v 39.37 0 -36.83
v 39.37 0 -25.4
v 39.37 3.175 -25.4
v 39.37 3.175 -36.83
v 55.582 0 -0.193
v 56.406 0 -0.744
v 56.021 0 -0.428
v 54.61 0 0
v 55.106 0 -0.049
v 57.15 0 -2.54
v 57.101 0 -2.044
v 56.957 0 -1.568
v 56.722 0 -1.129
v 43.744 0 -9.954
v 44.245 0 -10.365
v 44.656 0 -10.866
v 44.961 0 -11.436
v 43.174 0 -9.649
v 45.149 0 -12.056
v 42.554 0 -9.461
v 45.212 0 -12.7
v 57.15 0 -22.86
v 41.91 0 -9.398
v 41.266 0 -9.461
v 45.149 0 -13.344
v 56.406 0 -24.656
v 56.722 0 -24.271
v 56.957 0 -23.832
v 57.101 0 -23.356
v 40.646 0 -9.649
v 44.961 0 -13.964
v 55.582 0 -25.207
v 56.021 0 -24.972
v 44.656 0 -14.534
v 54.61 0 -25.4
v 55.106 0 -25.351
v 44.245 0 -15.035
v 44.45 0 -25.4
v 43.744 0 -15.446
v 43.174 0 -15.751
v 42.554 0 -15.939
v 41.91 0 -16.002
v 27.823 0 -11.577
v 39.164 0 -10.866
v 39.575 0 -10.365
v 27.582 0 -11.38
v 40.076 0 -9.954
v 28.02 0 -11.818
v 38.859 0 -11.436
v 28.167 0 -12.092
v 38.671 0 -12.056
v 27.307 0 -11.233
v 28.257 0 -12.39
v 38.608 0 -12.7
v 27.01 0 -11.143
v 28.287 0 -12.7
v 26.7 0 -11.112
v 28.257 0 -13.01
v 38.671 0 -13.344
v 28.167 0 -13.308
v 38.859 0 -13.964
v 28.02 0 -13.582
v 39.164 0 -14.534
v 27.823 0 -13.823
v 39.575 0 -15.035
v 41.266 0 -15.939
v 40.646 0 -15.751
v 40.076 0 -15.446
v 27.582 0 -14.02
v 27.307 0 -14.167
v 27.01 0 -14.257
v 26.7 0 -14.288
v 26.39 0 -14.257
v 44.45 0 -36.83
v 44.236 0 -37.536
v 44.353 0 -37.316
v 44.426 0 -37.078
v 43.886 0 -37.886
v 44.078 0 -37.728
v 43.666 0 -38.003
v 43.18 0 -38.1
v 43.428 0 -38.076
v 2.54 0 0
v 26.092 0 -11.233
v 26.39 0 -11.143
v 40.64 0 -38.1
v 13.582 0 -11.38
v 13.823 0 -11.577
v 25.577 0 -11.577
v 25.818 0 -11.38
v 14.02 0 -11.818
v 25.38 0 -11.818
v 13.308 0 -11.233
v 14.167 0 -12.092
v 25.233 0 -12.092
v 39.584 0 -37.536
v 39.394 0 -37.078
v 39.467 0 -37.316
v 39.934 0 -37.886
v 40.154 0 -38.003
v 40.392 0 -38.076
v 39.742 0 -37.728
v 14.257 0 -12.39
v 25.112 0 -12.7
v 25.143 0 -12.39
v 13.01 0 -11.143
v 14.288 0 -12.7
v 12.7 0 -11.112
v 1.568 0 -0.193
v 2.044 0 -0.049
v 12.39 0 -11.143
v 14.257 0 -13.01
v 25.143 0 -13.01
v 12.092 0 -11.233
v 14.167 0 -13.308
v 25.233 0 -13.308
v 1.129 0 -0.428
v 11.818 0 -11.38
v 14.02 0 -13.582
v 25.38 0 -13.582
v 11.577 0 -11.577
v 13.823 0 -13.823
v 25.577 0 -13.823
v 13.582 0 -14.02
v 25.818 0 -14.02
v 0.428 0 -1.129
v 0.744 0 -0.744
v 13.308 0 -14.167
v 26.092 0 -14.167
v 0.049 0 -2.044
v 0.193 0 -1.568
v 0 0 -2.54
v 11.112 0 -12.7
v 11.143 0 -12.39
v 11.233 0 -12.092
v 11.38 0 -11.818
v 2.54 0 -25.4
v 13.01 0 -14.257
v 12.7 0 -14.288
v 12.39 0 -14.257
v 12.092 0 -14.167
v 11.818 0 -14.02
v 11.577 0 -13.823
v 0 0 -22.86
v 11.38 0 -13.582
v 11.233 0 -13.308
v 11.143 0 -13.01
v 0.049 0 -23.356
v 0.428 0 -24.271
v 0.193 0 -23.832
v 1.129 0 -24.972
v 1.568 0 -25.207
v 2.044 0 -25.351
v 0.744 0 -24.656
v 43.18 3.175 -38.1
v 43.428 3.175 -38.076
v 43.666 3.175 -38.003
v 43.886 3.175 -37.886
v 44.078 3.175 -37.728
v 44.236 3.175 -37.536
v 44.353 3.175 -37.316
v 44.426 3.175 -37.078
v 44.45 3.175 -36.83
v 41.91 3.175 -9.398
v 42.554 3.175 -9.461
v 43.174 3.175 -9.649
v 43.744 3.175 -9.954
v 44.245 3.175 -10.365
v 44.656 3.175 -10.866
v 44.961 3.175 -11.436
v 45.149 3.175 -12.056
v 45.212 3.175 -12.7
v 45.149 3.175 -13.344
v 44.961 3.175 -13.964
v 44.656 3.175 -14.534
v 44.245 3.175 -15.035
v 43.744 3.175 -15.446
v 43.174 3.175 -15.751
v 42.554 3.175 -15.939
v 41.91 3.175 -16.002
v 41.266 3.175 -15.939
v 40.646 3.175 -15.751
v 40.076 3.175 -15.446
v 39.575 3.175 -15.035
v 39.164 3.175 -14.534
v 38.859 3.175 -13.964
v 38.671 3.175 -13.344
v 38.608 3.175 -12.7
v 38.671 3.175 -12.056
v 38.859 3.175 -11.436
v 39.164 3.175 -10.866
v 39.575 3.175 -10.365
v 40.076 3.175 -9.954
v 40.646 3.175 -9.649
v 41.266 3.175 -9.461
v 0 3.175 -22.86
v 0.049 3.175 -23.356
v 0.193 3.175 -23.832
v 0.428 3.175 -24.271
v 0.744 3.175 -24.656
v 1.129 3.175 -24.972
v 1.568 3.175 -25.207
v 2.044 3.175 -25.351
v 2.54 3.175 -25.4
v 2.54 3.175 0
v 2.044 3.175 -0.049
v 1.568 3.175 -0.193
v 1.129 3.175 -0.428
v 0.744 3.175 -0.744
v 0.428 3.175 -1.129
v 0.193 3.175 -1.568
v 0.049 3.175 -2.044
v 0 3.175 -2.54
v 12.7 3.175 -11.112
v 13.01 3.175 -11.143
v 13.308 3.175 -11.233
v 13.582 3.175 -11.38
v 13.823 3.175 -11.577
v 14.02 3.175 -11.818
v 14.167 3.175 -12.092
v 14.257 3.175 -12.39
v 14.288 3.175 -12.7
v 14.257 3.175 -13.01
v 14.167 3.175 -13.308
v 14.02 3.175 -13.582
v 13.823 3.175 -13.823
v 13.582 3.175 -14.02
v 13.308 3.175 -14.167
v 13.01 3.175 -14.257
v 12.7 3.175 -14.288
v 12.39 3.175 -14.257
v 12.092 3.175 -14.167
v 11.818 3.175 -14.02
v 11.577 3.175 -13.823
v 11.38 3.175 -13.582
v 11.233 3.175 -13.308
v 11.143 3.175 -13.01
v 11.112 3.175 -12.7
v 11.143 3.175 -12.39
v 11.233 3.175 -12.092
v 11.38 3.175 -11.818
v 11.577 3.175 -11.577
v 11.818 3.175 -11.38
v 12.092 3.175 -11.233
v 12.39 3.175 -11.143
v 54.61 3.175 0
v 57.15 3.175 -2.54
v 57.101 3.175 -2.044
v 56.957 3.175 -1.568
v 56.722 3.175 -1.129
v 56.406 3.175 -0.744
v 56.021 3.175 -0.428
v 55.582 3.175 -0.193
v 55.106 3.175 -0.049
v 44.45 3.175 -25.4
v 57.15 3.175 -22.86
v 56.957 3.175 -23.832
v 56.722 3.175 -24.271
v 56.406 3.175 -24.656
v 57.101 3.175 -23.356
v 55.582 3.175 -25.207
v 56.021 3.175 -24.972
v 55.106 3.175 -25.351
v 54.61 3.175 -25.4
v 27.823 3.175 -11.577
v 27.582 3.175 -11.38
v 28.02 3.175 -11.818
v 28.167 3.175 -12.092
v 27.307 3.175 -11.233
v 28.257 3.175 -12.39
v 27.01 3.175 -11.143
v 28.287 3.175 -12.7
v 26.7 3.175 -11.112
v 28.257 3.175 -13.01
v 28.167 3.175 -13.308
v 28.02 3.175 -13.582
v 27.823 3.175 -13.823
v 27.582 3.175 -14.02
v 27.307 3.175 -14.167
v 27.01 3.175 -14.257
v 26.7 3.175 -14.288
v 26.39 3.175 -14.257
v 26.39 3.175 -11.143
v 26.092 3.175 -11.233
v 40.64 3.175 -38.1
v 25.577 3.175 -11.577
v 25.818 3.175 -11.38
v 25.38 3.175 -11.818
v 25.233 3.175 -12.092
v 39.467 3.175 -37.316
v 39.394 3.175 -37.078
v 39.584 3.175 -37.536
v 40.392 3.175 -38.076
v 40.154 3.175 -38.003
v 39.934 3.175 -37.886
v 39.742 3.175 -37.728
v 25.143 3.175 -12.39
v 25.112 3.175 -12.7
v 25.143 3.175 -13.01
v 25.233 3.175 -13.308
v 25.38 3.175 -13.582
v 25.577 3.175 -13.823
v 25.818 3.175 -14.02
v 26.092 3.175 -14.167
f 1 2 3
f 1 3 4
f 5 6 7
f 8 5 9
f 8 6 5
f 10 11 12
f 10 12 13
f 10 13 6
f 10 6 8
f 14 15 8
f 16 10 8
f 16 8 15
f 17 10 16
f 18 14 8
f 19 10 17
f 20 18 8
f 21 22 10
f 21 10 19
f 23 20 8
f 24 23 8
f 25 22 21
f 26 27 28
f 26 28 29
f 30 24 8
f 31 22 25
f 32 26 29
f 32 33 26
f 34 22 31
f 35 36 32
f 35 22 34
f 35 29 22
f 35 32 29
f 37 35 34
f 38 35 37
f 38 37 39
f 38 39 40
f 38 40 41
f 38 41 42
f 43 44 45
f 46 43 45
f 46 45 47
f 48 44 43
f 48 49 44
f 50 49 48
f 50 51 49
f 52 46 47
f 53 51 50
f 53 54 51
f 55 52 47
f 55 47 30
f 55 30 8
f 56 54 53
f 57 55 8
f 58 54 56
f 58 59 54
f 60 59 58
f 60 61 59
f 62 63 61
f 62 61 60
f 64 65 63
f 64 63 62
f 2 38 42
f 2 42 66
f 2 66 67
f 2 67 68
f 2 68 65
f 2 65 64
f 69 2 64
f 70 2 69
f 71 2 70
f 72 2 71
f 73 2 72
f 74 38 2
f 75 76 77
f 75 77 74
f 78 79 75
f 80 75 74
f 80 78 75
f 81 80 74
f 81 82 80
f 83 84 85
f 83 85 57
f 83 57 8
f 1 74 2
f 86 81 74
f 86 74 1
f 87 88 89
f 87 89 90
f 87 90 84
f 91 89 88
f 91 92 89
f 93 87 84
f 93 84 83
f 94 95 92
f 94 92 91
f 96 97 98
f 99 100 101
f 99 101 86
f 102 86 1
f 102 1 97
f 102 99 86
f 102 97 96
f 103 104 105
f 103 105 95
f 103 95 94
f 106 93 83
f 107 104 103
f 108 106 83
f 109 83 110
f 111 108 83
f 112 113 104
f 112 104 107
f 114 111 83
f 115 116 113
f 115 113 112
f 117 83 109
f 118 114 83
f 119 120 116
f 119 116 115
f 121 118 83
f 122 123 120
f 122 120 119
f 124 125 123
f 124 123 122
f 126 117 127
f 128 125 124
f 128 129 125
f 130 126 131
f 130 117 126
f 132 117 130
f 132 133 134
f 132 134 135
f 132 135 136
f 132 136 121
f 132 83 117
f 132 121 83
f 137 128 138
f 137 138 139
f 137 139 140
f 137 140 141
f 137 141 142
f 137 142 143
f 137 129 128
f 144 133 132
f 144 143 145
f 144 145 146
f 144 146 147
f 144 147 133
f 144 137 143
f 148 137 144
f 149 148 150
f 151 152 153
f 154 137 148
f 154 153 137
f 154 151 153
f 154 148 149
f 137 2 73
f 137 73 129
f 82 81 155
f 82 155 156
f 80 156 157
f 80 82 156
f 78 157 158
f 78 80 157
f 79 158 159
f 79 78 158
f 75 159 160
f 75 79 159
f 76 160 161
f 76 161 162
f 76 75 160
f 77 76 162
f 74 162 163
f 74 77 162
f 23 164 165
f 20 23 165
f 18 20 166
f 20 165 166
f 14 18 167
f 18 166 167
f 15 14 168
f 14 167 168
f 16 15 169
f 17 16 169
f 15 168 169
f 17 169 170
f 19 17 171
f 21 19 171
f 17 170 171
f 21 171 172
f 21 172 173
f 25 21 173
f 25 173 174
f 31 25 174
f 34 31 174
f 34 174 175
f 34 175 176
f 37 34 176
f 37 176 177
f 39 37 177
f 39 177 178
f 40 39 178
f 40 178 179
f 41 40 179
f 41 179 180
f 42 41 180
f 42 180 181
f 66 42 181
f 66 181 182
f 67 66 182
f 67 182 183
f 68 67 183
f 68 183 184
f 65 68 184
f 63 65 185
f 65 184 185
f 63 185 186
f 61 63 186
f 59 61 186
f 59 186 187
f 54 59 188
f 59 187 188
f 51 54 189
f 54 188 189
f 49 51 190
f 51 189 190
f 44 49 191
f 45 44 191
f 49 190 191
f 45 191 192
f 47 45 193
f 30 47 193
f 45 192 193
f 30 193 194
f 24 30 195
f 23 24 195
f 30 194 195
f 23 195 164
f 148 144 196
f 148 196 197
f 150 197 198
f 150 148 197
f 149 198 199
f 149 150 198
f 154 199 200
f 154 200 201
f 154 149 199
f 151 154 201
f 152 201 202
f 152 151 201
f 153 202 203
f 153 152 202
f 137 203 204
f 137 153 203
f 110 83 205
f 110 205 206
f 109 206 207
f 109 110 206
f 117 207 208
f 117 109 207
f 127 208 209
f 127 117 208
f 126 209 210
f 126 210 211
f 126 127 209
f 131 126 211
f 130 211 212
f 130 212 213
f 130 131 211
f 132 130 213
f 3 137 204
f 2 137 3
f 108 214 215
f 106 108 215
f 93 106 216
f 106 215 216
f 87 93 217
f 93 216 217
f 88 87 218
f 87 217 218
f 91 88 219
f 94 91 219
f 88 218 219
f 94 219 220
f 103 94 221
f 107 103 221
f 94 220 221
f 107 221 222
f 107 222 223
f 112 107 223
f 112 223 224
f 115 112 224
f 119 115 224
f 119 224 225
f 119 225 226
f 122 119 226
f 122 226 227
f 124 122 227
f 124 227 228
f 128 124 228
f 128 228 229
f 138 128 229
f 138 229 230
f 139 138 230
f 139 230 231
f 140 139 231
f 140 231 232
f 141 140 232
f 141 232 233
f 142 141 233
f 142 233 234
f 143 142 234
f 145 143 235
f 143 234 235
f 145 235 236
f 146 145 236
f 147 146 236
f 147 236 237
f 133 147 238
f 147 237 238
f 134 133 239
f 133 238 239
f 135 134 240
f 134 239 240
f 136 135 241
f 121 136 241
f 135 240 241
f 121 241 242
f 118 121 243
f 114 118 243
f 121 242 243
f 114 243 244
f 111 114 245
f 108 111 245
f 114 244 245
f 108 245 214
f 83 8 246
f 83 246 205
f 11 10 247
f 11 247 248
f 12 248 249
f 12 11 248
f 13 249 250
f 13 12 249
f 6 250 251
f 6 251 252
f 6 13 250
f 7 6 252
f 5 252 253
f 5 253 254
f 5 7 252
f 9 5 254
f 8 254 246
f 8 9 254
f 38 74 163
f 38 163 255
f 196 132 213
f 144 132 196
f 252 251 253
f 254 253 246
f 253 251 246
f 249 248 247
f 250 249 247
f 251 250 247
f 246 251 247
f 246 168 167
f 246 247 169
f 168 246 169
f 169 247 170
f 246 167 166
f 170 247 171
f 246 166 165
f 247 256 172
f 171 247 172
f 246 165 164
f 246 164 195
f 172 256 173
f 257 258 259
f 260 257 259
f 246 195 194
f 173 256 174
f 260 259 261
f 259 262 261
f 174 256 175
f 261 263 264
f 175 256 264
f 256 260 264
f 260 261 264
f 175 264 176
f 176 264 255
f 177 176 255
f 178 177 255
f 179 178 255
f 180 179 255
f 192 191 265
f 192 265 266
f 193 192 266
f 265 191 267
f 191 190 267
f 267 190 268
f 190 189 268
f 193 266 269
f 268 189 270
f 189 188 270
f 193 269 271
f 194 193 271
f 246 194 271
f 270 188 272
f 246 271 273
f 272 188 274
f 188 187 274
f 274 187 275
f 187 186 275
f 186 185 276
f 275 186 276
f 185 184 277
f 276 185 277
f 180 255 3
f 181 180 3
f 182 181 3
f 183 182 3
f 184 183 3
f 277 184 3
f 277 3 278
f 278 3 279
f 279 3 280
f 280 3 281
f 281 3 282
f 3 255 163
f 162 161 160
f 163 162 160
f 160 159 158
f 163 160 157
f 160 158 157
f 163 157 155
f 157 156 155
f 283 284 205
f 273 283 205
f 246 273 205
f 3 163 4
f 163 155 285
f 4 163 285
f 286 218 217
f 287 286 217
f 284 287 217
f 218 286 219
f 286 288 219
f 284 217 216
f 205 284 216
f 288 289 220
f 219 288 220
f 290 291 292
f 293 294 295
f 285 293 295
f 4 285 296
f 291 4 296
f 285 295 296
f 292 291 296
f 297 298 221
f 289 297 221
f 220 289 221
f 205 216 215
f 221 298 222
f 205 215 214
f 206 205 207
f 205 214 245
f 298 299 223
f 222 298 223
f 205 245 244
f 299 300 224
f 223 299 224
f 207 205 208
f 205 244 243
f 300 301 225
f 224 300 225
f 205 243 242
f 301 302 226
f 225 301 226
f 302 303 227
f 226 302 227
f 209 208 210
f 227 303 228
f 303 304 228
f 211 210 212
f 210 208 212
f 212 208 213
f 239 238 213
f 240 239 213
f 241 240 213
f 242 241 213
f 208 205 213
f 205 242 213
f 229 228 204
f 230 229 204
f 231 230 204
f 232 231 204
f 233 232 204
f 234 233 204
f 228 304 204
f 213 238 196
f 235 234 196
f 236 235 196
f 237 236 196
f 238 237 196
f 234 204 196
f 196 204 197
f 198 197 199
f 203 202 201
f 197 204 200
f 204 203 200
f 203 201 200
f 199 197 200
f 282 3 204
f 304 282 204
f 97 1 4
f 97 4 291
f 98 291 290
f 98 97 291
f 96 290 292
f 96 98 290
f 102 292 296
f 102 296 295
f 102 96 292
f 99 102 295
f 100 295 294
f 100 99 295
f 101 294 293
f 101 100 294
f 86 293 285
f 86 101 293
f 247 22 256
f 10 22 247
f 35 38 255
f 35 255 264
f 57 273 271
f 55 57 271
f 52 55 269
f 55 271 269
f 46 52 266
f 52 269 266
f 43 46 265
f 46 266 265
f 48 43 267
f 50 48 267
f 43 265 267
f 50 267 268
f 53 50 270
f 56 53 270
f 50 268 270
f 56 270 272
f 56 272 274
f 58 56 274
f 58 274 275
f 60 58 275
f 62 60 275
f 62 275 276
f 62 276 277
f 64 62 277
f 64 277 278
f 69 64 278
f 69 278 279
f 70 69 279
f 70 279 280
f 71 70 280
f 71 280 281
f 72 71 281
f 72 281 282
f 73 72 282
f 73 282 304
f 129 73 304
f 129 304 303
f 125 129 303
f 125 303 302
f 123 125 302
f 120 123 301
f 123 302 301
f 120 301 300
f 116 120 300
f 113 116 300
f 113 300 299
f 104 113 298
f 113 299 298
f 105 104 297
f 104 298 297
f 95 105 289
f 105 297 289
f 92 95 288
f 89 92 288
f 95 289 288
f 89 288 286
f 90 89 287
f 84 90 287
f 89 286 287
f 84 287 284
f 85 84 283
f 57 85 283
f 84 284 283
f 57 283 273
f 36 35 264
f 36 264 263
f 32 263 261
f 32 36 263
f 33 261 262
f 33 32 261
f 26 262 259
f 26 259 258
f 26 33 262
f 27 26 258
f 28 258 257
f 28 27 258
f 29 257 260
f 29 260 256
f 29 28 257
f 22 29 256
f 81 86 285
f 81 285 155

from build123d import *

# Parameters (mm, degrees)
BOSS_EXTRUDE1_DEPTH = 3.175
CUT_EXTRUDE1_REACH  = 70.759
SKETCH2_R           = 1.5875
SKETCH2_R_2         = 3.302


with BuildPart() as part:
    # Sketch1 → Boss-Extrude1 (new body)
    with BuildSketch(Plane(origin=(0, 0, 0), x_dir=(1, 0, 0), z_dir=(0, 1, 0))):
        with BuildLine():
            Line((44.45, 25.4), (54.61, 25.4))
            ThreePointArc((54.61, 25.4), (56.406051224, 24.656051224), (57.15, 22.86))
            Line((57.15, 22.86), (57.15, 2.54))
            ThreePointArc((57.15, 2.54), (56.406051224, 0.743948776), (54.61, 0))
            Line((54.61, 0), (2.54, 0))
            ThreePointArc((2.54, 0), (0.743948776, 0.743948776), (0, 2.54))
            Line((0, 2.54), (0, 22.86))
            ThreePointArc((0, 22.86), (0.743948776, 24.656051224), (2.54, 25.4))
            Line((2.54, 25.4), (39.37, 25.4))
            Line((39.37, 25.4), (39.37, 36.83))
            ThreePointArc((39.37, 36.83), (39.741974388, 37.728025612), (40.64, 38.1))
            Line((40.64, 38.1), (43.18, 38.1))
            ThreePointArc((43.18, 38.1), (44.078025612, 37.728025612), (44.45, 36.83))
            Line((44.45, 36.83), (44.45, 25.4))
        make_face()
    extrude(amount=BOSS_EXTRUDE1_DEPTH)

    # Sketch2 → Cut-Extrude1 (cut, up to next)
    with BuildSketch(Plane(origin=(0, 3.175, 0), x_dir=(1, 0, 0), z_dir=(0, 1, 0)), mode=Mode.PRIVATE) as cut_extrude1_sk1:
        with Locations(Location((12.7, 12.7, 0), (0, 0, 270))):
            Circle(SKETCH2_R)
    cut_extrude1_tool1 = extrude(cut_extrude1_sk1.sketch, amount=-CUT_EXTRUDE1_REACH, mode=Mode.PRIVATE) & part.part
    # Sketch2 → Cut-Extrude1 (cut, up to next)
    with BuildSketch(Plane(origin=(0, 3.175, 0), x_dir=(1, 0, 0), z_dir=(0, 1, 0)), mode=Mode.PRIVATE) as cut_extrude1_sk2:
        with Locations(Location((26.699972, 12.7, 0), (0, 0, 270))):
            Circle(SKETCH2_R)
    cut_extrude1_tool2 = extrude(cut_extrude1_sk2.sketch, amount=-CUT_EXTRUDE1_REACH, mode=Mode.PRIVATE) & part.part
    # Sketch2 → Cut-Extrude1 (cut, up to next)
    with BuildSketch(Plane(origin=(0, 3.175, 0), x_dir=(1, 0, 0), z_dir=(0, 1, 0)), mode=Mode.PRIVATE) as cut_extrude1_sk3:
        with Locations(Location((41.91, 12.7, 0), (0, 0, 270))):
            Circle(SKETCH2_R_2)
    cut_extrude1_tool3 = extrude(cut_extrude1_sk3.sketch, amount=-CUT_EXTRUDE1_REACH, mode=Mode.PRIVATE) & part.part
    add(cut_extrude1_tool1.solids().sort_by_distance((12.7, 3.175, -12.7))[0], mode=Mode.SUBTRACT)
    add(cut_extrude1_tool2.solids().sort_by_distance((26.699972, 3.175, -12.7))[0], mode=Mode.SUBTRACT)
    add(cut_extrude1_tool3.solids().sort_by_distance((41.91, 3.175, -12.7))[0], mode=Mode.SUBTRACT)


solid = part.part
